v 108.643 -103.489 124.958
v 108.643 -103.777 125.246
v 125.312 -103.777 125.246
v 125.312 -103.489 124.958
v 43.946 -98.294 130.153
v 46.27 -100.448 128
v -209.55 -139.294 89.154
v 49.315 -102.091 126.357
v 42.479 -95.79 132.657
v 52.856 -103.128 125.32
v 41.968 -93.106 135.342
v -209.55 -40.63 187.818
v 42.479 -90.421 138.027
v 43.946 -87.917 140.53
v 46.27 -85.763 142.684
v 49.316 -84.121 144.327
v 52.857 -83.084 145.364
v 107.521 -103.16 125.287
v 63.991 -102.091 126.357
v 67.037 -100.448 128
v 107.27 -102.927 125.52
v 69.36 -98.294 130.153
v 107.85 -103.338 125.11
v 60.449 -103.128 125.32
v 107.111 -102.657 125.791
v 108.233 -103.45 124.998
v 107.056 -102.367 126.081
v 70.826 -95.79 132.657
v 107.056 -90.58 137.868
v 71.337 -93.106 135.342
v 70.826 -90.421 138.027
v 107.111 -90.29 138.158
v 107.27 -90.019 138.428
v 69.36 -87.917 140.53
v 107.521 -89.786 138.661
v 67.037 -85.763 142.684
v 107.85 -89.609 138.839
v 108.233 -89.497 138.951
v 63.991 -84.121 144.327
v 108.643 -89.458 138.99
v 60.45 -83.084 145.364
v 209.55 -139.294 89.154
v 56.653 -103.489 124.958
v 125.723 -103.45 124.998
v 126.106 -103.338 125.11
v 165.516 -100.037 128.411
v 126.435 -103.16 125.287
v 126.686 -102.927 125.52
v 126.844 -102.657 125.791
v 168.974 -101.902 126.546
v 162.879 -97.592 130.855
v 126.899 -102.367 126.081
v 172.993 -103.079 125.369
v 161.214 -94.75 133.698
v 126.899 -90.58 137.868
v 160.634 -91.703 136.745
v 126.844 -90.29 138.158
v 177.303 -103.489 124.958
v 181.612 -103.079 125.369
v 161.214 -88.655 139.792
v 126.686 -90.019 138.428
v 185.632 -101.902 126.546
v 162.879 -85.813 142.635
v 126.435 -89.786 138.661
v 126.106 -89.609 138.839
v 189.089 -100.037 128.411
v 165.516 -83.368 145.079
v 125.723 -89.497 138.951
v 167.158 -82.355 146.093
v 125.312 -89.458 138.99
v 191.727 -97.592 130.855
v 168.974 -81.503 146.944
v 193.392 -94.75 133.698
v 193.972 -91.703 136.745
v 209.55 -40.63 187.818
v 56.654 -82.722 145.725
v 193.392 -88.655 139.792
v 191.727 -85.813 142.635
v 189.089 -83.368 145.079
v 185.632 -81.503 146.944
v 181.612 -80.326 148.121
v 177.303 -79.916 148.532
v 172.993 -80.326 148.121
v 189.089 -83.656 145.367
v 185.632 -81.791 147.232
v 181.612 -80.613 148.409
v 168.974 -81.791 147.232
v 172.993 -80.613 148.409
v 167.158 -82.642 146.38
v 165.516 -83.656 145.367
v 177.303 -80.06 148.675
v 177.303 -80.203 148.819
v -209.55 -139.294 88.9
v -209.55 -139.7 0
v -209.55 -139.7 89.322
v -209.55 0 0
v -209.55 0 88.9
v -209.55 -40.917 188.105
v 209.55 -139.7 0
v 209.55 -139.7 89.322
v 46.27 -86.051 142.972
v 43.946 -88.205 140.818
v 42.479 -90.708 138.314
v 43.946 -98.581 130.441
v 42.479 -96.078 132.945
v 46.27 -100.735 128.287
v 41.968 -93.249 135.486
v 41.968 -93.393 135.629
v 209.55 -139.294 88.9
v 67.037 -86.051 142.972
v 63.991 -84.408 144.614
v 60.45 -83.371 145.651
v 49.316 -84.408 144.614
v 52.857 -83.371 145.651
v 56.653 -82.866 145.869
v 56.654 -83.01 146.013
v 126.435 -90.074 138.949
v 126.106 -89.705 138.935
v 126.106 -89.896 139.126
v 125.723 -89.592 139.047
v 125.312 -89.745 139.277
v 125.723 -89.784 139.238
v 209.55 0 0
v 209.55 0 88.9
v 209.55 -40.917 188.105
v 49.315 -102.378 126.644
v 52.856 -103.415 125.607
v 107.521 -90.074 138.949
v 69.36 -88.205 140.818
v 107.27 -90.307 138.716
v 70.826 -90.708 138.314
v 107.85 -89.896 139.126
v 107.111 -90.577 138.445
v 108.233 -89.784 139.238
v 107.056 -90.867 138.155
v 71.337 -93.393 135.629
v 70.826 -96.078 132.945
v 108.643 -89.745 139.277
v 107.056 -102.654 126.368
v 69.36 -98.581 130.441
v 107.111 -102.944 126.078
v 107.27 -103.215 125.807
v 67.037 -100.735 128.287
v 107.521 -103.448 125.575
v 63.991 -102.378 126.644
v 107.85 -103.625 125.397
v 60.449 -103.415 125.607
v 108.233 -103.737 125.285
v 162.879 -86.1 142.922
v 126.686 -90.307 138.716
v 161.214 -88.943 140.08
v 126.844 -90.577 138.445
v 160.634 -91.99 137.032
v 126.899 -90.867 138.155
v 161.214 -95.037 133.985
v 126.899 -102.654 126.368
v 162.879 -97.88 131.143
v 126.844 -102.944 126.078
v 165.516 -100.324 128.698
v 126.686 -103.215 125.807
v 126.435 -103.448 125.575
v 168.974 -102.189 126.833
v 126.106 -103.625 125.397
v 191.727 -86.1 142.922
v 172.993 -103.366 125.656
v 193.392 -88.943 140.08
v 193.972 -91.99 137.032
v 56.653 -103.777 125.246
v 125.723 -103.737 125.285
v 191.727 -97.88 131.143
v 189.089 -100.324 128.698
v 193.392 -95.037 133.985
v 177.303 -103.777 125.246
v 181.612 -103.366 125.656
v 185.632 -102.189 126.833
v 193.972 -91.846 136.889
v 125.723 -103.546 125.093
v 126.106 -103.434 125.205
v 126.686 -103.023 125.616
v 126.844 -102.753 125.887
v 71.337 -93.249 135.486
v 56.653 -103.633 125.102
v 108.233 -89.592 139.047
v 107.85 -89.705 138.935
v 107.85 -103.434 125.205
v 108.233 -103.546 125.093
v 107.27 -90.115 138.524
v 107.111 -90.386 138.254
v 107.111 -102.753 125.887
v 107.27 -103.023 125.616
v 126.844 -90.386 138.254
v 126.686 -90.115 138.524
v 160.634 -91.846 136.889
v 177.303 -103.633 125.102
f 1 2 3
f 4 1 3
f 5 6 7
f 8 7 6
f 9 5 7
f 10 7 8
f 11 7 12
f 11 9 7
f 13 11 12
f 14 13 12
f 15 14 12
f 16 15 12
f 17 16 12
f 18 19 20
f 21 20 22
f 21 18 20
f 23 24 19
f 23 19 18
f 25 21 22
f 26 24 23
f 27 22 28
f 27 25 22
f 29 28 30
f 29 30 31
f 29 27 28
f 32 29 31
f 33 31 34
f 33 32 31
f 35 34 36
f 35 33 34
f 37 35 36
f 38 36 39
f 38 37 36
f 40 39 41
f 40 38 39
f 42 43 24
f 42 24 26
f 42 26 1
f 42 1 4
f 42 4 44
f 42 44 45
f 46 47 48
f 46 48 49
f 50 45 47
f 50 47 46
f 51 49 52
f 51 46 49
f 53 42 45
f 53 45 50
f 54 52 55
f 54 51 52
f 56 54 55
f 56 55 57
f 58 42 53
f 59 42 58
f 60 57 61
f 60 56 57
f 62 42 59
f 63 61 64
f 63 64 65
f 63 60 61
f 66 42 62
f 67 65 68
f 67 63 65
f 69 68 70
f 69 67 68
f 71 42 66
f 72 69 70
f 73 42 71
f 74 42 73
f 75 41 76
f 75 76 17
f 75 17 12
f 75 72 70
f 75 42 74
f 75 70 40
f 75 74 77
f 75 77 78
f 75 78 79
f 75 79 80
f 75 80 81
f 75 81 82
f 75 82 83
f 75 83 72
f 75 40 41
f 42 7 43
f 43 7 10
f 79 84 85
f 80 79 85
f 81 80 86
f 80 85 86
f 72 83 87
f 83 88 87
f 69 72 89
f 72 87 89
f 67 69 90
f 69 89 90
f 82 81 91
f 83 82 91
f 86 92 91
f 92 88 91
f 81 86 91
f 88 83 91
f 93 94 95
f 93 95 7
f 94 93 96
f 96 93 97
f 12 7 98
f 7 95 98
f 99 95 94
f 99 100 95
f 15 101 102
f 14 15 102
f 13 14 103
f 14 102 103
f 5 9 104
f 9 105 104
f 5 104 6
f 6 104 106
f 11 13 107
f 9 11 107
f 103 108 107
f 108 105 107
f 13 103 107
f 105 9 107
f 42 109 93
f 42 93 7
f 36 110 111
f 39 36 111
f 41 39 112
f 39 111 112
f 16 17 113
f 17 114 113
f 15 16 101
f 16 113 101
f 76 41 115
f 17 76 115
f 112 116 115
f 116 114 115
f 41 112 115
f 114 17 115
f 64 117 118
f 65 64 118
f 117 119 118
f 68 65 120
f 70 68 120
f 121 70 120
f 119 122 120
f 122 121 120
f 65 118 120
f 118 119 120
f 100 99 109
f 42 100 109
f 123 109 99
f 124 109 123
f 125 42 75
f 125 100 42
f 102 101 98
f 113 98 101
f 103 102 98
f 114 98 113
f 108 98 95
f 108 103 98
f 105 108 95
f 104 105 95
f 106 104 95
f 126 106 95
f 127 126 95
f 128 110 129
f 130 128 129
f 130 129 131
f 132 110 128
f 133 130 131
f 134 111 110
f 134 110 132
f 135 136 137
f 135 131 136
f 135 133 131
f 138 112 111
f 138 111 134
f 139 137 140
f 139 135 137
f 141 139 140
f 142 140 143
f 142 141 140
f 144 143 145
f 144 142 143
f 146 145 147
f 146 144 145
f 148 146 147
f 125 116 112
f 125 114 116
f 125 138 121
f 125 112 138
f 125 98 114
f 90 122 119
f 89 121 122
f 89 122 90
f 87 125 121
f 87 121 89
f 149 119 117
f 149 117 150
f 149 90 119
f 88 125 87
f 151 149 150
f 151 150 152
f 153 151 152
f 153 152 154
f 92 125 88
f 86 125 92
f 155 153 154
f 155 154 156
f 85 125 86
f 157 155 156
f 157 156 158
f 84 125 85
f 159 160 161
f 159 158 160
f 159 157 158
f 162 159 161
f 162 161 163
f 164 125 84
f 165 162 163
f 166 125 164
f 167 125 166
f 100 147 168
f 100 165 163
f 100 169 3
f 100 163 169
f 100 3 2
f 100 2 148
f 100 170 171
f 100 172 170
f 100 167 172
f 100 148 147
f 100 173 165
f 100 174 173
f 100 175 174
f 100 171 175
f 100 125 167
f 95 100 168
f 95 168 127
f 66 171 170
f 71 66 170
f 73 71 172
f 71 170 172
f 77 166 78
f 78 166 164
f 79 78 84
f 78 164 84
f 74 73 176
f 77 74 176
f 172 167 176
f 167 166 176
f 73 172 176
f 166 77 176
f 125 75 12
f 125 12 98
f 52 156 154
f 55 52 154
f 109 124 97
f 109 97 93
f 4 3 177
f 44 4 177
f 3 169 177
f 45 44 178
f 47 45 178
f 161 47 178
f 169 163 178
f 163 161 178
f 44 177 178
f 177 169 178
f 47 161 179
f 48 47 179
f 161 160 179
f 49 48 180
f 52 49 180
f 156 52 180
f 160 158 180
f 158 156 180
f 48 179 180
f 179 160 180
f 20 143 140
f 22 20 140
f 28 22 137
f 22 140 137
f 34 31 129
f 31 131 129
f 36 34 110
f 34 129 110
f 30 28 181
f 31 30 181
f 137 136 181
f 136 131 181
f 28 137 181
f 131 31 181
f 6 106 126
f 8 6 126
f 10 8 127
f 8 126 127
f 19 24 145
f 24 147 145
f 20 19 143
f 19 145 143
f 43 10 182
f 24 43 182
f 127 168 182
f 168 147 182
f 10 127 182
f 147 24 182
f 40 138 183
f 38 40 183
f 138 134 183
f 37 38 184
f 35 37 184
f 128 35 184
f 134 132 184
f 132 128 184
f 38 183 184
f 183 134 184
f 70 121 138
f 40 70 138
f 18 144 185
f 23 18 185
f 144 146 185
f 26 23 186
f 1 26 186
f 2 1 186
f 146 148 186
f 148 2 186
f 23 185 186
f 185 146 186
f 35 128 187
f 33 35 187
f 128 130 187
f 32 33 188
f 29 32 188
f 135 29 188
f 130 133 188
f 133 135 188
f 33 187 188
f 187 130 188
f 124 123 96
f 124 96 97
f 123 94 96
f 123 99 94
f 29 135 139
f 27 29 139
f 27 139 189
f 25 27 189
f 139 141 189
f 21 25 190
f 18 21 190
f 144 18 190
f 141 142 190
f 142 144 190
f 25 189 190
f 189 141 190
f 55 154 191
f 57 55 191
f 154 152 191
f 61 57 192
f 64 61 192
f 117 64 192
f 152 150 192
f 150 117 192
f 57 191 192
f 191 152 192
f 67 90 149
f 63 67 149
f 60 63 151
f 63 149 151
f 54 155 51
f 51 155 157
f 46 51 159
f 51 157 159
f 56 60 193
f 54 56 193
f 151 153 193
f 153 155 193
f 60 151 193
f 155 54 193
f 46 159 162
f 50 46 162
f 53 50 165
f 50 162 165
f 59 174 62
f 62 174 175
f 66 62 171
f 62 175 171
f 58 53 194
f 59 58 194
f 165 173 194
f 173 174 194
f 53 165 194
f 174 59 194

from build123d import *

# Parameters (mm, degrees)
F1_DEPTH = 209.55
F3_DEPTH = 0.4064


# Not quite as in the source:
# - the dataset's text gives a spline's control points without its knots; the knots are read off the source's solid


with BuildPart() as f1:
    # F0 (on Right) → F1 (new body, symmetric)
    with BuildSketch(Plane.YZ):
        Polygon((-139.7, 0), (0, 0), (0, 88.9), (-139.2936, 88.9), (-139.2936, 89.154), (-40.6298144724, 187.8177855276), (-40.9171826682, 188.1051537235), (-139.7, 89.3223363917), align=None)
    extrude(amount=F1_DEPTH, both=True)

    # F2 (on face) → F3 (cut, through all)
    with BuildSketch(Plane(origin=(0, -114.5111681959, 114.5111681959), x_dir=(1, 0, 0), z_dir=(0, -0.7071067812, 0.7071067812))):
        with BuildLine():
            add(Edge.make_bspline(
                [(107.5209936486, 34.5596805655), (107.2271156486, 34.2660057655), (107.0557164486, 33.8529255655), (107.0557164486, 33.4373053655)],
                knots=[1, 1, 1, 1, 2, 2, 2, 2], degree=3))
            Line((107.0557164486, 33.4373053655), (107.0557164486, 16.7685553655))
            add(Edge.make_bspline(
                [(107.0557164486, 16.7685553655), (107.0557164486, 16.3530875655), (107.2271156486, 15.9400073655), (107.5209936486, 15.6461547655)],
                knots=[0, 0, 0, 0, 1, 1, 1, 1], degree=3))
            add(Edge.make_bspline(
                [(107.5209936486, 15.6461547655), (107.8148462486, 15.3522767655), (108.2279264486, 15.1810553655), (108.6432164486, 15.1810553655)],
                knots=[1, 1, 1, 1, 2, 2, 2, 2], degree=3))
            Line((108.6432164486, 15.1810553655), (125.3119664486, 15.1810553655))
            add(Edge.make_bspline(
                [(125.3119664486, 15.1810553655), (125.7282978486, 15.1810553655), (126.1410224486, 15.3522767655), (126.4352306486, 15.6461547655)],
                knots=[0, 0, 0, 0, 1, 1, 1, 1], degree=3))
            add(Edge.make_bspline(
                [(126.4352306486, 15.6461547655), (126.7287784486, 15.9400073655), (126.8994664486, 16.3530875655), (126.8994664486, 16.7685553655)],
                knots=[1, 1, 1, 1, 2, 2, 2, 2], degree=3))
            Line((126.8994664486, 16.7685553655), (126.8994664486, 33.4373053655))
            add(Edge.make_bspline(
                [(126.8994664486, 33.4373053655), (126.8994664486, 33.8529255655), (126.7287784486, 34.2660057655), (126.4352306486, 34.5596805655)],
                knots=[0, 0, 0, 0, 1, 1, 1, 1], degree=3))
            add(Edge.make_bspline(
                [(126.4352306486, 34.5596805655), (126.1410224486, 34.8537363655), (125.7282978486, 35.0248053655), (125.3119664486, 35.0248053655)],
                knots=[1, 1, 1, 1, 2, 2, 2, 2], degree=3))
            Line((125.3119664486, 35.0248053655), (108.6432164486, 35.0248053655))
            add(Edge.make_bspline(
                [(108.6432164486, 35.0248053655), (108.2279264486, 35.0248053655), (107.8148462486, 34.8537363655), (107.5209936486, 34.5596805655)],
                knots=[0, 0, 0, 0, 1, 1, 1, 1], degree=3))
        make_face()
        with BuildLine():
            add(Edge.make_bspline(
                [(67.0366194486, 40.2491027655), (64.3180828486, 42.9673091655), (60.4971608486, 44.5497799655), (56.6525914486, 44.5497799655)],
                knots=[7, 7, 7, 7, 8, 8, 8, 8], degree=3))
            add(Edge.make_bspline(
                [(56.6525914486, 44.5497799655), (52.8087078486, 44.5497799655), (48.9877858486, 42.9673091655), (46.2695794486, 40.2491027655)],
                knots=[0, 0, 0, 0, 1, 1, 1, 1], degree=3))
            add(Edge.make_bspline(
                [(46.2695794486, 40.2491027655), (43.5510936486, 37.5305661655), (41.9682164486, 33.7101267655), (41.9682164486, 29.8654303655), (41.9682164486, 26.0211911655), (43.5510936486, 22.2004469655), (46.2695794486, 19.4822405655)],
                knots=[1, 1, 1, 1, 2, 2, 2, 3, 3, 3, 3], degree=3))
            add(Edge.make_bspline(
                [(46.2695794486, 19.4822405655), (48.9877858486, 16.7637039655), (52.8087078486, 15.1810553655), (56.6525914486, 15.1810553655), (60.4971608486, 15.1810553655), (64.3180828486, 16.7637039655), (67.0366194486, 19.4822405655)],
                knots=[3, 3, 3, 3, 4, 4, 4, 5, 5, 5, 5], degree=3))
            add(Edge.make_bspline(
                [(67.0366194486, 19.4822405655), (69.7551814486, 22.2004469655), (71.3369664486, 26.0211911655), (71.3369664486, 29.8654303655), (71.3369664486, 33.7101267655), (69.7551814486, 37.5305661655), (67.0366194486, 40.2491027655)],
                knots=[5, 5, 5, 5, 6, 6, 6, 7, 7, 7, 7], degree=3))
        make_face()
        with BuildLine():
            add(Edge.make_bspline(
                [(189.0894868486, 43.6364975655), (186.0037170486, 46.7222673655), (181.6666416486, 48.5185299655), (177.3027692486, 48.5185299655)],
                knots=[7, 7, 7, 7, 8, 8, 8, 8], degree=3))
            add(Edge.make_bspline(
                [(177.3027692486, 48.5185299655), (172.9388714486, 48.5185299655), (168.6018468486, 46.7222673655), (165.5164072486, 43.6364975655)],
                knots=[0, 0, 0, 0, 1, 1, 1, 1], degree=3))
            add(Edge.make_bspline(
                [(165.5164072486, 43.6364975655), (162.4309930486, 40.5507277655), (160.6340192486, 36.2136777655), (160.6340192486, 31.8498053655), (160.6340192486, 27.4859075655), (162.4309930486, 23.1488575655), (165.5164072486, 20.0630877655)],
                knots=[1, 1, 1, 1, 2, 2, 2, 3, 3, 3, 3], degree=3))
            add(Edge.make_bspline(
                [(165.5164072486, 20.0630877655), (168.6018468486, 16.9776735655), (172.9388714486, 15.1810553655), (177.3027692486, 15.1810553655), (181.6666416486, 15.1810553655), (186.0037170486, 16.9776735655), (189.0894868486, 20.0630877655)],
                knots=[3, 3, 3, 3, 4, 4, 4, 5, 5, 5, 5], degree=3))
            add(Edge.make_bspline(
                [(189.0894868486, 20.0630877655), (192.1752312486, 23.1488575655), (193.9715192486, 27.4859075655), (193.9715192486, 31.8498053655), (193.9715192486, 36.2136777655), (192.1752312486, 40.5507277655), (189.0894868486, 43.6364975655)],
                knots=[5, 5, 5, 5, 6, 6, 6, 7, 7, 7, 7], degree=3))
        make_face()
    extrude(amount=-F3_DEPTH, mode=Mode.SUBTRACT)


solid = f1.part
